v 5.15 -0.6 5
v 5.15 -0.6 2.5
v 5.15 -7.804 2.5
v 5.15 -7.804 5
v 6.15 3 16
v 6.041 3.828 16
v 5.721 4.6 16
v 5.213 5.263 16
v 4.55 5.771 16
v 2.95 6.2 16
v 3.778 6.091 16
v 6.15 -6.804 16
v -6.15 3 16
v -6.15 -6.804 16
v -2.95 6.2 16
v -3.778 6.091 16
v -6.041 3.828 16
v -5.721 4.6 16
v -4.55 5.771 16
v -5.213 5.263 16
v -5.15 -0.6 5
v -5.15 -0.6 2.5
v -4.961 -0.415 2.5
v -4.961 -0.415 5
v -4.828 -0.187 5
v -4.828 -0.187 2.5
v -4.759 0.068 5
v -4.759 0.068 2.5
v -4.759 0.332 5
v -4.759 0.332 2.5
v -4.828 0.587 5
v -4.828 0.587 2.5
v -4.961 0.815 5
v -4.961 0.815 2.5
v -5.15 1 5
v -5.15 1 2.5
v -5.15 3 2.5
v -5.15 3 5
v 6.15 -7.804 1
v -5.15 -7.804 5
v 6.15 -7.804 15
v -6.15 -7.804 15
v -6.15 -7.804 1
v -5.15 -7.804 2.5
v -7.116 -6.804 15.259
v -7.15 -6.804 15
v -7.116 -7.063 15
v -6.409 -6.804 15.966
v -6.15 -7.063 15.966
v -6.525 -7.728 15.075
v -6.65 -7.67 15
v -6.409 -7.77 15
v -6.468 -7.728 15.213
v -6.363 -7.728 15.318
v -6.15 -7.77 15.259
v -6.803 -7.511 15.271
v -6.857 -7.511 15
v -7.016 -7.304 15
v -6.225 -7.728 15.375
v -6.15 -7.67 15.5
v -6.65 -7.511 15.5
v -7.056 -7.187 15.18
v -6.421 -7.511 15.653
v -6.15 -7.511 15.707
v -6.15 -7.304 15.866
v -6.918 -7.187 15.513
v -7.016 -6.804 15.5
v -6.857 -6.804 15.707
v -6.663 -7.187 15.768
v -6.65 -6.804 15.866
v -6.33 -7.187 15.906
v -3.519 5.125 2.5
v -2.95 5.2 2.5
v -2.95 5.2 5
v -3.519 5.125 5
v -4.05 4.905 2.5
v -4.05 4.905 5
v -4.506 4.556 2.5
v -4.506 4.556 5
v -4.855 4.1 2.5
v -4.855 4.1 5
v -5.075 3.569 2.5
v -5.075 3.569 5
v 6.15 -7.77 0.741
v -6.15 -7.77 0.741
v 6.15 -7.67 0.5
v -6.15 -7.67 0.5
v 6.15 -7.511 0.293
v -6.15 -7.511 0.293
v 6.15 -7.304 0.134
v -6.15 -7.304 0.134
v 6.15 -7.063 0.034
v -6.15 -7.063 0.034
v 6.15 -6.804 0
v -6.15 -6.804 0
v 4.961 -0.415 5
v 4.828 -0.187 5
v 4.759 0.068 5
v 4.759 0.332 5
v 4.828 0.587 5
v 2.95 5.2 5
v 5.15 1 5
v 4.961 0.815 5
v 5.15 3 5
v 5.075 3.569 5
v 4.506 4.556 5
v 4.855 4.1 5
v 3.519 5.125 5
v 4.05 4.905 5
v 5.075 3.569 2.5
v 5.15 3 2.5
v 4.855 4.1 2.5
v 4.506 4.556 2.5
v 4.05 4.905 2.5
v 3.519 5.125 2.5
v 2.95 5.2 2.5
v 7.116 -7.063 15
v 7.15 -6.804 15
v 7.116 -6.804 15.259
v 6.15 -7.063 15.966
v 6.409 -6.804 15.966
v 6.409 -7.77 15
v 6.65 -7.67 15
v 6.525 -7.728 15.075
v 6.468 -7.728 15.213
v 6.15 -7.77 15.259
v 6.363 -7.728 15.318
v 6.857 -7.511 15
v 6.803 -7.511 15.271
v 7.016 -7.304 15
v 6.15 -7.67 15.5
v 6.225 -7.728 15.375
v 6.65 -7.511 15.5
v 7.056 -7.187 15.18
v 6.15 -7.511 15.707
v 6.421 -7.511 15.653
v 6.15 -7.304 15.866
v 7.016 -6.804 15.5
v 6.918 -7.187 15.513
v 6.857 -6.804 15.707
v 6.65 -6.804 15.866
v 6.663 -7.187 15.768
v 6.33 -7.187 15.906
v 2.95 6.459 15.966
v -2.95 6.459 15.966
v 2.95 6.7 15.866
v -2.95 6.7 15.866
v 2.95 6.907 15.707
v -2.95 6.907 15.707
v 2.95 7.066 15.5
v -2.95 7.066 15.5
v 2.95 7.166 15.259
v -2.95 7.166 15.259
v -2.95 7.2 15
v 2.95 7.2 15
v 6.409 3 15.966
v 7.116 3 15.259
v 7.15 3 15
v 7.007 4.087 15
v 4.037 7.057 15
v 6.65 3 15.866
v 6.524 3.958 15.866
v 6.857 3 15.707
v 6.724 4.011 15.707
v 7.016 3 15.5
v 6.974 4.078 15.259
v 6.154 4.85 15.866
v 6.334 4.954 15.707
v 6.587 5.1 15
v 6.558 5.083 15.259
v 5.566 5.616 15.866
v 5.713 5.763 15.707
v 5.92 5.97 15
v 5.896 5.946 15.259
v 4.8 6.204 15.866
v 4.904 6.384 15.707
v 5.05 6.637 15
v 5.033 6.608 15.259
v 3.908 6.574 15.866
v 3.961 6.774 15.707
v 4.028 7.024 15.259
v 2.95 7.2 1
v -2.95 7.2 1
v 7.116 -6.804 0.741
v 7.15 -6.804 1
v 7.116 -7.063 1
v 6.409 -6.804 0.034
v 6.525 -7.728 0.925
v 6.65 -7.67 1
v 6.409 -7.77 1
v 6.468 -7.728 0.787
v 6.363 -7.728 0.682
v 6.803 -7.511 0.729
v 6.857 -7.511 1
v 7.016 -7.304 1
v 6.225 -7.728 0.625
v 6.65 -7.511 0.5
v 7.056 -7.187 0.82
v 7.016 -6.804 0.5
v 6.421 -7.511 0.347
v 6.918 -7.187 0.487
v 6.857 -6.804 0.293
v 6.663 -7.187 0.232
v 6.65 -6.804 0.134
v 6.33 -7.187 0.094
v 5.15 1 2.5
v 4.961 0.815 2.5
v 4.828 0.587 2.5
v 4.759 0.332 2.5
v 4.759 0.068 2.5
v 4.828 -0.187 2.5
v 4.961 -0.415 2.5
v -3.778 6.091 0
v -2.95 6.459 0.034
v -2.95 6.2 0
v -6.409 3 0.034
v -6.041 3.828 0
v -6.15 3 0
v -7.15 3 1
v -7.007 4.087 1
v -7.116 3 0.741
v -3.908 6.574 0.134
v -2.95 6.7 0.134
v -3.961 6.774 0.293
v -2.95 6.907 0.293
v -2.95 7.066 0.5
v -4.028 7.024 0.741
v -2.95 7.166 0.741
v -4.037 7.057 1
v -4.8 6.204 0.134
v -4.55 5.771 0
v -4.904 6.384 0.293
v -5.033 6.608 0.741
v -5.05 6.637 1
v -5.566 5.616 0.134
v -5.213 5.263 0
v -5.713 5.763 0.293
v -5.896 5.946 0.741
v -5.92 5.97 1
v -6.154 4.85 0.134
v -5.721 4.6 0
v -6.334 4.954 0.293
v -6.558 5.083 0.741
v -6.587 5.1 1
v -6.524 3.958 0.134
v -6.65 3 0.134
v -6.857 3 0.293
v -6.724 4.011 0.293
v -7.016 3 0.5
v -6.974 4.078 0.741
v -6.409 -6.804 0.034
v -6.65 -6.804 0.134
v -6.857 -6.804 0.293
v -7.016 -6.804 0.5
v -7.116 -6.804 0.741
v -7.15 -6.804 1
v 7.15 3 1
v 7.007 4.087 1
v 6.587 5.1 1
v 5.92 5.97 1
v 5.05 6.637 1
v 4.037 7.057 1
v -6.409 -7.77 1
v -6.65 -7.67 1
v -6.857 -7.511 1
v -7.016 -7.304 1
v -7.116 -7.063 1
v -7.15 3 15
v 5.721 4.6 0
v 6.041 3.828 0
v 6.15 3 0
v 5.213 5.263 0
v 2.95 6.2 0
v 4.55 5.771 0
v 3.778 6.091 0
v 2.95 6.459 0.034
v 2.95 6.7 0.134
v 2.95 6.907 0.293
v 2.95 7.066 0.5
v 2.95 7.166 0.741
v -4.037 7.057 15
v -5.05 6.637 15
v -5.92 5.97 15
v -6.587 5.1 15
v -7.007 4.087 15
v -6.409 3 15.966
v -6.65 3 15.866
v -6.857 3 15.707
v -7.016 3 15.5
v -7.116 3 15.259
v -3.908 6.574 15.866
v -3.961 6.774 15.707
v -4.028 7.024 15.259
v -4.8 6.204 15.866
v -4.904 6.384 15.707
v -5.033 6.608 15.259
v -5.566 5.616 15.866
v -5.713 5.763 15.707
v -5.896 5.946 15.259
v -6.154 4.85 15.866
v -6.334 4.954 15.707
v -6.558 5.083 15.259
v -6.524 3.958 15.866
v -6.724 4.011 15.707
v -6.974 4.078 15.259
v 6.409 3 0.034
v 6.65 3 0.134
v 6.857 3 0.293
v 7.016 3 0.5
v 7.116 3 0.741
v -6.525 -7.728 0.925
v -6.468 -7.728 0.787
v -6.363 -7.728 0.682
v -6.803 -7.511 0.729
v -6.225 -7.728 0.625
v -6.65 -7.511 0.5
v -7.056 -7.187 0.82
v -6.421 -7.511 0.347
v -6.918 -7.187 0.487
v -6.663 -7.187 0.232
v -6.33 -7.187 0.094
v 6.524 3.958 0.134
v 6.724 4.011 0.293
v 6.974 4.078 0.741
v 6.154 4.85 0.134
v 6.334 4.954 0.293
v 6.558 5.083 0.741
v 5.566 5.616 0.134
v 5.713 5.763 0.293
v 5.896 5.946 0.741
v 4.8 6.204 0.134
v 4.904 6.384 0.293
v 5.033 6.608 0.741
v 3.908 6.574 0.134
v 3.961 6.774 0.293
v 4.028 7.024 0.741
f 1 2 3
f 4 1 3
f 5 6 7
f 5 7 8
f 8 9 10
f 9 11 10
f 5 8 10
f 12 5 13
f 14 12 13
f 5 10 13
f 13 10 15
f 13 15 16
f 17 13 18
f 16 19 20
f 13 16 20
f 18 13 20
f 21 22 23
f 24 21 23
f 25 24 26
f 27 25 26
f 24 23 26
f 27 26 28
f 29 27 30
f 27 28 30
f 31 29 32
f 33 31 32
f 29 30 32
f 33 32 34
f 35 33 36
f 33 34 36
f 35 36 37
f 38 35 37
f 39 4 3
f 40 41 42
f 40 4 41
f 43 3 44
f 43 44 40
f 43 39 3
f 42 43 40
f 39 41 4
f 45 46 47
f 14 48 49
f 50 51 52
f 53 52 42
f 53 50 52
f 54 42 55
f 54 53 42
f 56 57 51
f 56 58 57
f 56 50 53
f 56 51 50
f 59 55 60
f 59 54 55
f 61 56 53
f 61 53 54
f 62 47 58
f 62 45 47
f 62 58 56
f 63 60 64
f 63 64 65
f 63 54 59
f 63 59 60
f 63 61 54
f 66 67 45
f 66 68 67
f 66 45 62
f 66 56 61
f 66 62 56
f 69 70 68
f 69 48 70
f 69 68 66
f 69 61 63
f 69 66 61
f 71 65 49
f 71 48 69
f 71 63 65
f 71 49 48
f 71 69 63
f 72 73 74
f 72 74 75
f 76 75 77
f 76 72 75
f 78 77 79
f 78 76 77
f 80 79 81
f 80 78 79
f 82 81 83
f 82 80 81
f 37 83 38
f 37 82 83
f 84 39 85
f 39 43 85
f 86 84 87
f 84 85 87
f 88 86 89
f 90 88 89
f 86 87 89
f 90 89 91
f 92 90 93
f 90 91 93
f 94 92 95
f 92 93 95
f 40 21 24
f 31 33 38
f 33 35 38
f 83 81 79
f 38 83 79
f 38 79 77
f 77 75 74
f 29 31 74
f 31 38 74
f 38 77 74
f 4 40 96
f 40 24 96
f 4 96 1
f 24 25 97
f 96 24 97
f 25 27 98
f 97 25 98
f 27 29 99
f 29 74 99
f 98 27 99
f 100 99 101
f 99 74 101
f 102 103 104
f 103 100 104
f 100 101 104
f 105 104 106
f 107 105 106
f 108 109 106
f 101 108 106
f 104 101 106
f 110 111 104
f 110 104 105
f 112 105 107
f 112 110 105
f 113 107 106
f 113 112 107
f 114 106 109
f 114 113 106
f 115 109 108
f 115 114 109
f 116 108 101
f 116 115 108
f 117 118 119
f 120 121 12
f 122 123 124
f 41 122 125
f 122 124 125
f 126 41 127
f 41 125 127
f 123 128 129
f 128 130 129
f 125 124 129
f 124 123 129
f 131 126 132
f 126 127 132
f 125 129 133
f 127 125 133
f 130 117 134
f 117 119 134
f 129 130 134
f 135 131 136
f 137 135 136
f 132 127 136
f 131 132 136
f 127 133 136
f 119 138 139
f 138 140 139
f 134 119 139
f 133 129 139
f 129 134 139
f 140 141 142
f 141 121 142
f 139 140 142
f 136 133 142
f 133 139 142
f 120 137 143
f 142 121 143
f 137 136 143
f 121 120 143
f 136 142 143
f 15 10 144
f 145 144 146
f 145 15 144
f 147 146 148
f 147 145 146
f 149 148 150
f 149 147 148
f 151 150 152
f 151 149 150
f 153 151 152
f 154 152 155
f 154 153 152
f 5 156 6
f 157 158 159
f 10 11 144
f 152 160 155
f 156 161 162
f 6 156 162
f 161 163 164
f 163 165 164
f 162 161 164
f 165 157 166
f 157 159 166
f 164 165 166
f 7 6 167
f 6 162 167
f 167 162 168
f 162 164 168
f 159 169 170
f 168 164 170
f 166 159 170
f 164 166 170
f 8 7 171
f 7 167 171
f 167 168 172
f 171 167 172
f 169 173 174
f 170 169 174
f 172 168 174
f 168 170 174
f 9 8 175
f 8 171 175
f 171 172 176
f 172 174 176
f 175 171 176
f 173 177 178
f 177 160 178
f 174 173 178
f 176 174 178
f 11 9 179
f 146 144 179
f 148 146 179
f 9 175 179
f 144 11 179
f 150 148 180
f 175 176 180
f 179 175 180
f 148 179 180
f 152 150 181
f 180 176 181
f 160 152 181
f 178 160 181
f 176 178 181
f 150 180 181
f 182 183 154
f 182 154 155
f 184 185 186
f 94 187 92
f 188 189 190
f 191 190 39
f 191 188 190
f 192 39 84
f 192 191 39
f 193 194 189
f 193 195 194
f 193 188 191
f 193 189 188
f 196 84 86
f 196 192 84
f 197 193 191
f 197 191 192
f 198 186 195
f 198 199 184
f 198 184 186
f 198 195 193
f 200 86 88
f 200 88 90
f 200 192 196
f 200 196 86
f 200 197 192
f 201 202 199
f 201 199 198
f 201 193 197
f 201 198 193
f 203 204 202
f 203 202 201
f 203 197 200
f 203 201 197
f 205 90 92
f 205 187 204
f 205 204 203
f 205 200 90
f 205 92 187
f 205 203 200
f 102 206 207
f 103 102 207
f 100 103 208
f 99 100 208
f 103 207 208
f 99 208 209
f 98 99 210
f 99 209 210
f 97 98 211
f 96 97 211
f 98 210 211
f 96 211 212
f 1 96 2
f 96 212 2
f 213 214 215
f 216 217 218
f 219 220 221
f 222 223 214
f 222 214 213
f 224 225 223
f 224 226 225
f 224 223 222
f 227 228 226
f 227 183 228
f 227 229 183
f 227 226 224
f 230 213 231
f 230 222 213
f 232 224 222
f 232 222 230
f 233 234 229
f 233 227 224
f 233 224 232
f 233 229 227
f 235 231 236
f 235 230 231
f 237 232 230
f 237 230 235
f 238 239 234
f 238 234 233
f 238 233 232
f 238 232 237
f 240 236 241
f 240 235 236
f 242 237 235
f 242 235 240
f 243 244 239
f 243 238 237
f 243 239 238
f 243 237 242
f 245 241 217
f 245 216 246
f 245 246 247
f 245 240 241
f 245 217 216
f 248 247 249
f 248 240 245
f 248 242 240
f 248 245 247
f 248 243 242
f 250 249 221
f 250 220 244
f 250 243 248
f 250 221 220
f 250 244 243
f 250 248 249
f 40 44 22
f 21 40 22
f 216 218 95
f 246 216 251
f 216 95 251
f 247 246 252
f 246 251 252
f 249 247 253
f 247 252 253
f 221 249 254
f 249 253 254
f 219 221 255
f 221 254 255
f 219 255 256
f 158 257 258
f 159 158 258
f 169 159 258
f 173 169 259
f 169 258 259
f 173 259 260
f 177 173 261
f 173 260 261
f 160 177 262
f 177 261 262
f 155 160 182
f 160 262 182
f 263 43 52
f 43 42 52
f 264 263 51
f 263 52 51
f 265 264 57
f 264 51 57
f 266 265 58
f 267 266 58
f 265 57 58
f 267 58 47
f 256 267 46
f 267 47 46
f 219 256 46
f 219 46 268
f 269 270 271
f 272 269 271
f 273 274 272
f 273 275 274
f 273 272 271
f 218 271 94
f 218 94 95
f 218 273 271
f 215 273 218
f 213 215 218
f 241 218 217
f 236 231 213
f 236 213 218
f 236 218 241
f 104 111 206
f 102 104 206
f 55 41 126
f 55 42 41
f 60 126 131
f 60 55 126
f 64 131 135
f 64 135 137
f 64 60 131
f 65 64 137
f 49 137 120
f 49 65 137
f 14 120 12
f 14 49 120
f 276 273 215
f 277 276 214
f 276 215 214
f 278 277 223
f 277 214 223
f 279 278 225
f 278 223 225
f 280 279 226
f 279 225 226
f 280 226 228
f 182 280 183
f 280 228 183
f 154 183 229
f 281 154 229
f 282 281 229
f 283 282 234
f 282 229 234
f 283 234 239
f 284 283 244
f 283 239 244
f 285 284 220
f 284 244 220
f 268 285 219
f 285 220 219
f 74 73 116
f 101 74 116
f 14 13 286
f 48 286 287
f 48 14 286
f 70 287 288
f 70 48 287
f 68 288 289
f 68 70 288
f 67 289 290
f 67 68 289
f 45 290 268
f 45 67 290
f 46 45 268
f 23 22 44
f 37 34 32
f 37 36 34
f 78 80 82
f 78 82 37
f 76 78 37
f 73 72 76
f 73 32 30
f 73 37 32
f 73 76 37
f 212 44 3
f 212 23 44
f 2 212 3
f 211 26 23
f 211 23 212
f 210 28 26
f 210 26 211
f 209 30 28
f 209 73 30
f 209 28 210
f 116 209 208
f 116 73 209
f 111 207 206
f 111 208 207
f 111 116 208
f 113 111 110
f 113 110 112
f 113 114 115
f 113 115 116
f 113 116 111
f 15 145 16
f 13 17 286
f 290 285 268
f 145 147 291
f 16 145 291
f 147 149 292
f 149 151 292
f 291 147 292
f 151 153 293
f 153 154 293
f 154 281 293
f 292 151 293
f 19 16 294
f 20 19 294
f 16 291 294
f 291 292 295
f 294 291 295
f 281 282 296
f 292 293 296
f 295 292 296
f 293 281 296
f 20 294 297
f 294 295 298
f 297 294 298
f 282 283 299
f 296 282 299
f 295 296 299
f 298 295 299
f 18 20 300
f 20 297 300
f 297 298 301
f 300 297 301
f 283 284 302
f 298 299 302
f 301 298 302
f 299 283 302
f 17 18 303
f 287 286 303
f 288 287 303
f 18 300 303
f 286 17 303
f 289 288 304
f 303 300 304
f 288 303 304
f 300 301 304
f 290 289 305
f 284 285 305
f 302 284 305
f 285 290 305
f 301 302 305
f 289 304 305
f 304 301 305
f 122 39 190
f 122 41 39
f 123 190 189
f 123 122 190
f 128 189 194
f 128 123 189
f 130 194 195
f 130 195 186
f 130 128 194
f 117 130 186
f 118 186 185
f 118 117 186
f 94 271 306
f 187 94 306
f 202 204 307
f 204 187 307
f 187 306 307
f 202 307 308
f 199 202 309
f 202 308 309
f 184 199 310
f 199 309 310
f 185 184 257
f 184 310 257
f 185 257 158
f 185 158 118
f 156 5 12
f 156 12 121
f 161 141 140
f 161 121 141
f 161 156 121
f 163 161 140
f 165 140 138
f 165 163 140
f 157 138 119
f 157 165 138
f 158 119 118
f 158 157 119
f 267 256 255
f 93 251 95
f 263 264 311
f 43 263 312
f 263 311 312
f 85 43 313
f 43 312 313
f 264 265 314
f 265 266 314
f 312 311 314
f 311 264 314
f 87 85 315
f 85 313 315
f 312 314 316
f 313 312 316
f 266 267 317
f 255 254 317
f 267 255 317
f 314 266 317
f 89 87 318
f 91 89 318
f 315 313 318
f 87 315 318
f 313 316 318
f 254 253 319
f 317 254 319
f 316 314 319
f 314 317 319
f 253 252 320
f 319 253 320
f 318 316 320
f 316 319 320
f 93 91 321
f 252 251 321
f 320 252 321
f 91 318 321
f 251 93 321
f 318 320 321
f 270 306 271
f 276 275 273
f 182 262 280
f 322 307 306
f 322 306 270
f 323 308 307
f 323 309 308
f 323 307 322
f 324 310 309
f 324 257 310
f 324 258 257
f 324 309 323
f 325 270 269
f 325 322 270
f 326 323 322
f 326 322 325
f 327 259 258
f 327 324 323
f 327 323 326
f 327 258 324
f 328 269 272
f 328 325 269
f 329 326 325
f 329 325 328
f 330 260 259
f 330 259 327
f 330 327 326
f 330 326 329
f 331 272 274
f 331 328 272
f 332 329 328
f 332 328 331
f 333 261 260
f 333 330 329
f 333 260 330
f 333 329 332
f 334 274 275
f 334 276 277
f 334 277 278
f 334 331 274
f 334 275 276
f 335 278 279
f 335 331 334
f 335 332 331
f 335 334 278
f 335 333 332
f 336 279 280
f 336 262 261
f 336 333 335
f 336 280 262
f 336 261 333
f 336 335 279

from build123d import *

# Parameters (mm, degrees)
PAD002_DEPTH = 16
POCKET_DEPTH = 2.5
FILLET001_R  = 1


with BuildPart() as part:
    # Sketch003 → Pad002 (new body)
    with BuildSketch(Plane.XY):
        with BuildLine():
            Line((7.15, -7.803847), (-7.15, -7.803847))
            Line((-7.15, -7.803847), (-7.15, 3))
            ThreePointArc((-2.95, 7.2), (-5.919848, 5.969848), (-7.15, 3))
            Line((-2.95, 7.2), (2.95, 7.2))
            ThreePointArc((7.15, 3), (5.919848, 5.969848), (2.95, 7.2))
            Line((7.15, 3), (7.15, -7.803847))
        make_face()
    extrude(amount=PAD002_DEPTH)

    # Sketch004 → Pocket (cut)
    with BuildSketch(Plane.XY.offset(2.5)):
        with BuildLine():
            ThreePointArc((-2.95, 5.2), (-4.505635, 4.555635), (-5.15, 3))
            Line((-5.15, 1), (-5.15, 3))
            ThreePointArc((-5.15, -0.6), (-4.75, 0.2), (-5.15, 1))
            Line((-5.15, -7.803847), (-5.15, -0.6))
            Line((5.15, -7.803847), (-5.15, -7.803847))
            Line((5.15, -0.6), (5.15, -7.803847))
            ThreePointArc((5.15, 1), (4.75, 0.2), (5.15, -0.6))
            Line((5.15, 3), (5.15, 1))
            ThreePointArc((5.15, 3), (4.505635, 4.555635), (2.95, 5.2))
            Line((-2.95, 5.2), (2.95, 5.2))
        make_face()
    extrude(amount=POCKET_DEPTH, mode=Mode.SUBTRACT)

    # Fillet001
    fillet001_edges = [part.edges().sort_by_distance(p)[0] for p in [
        (-5.919848, 5.969848, 0),
        (-5.919848, 5.969848, 16),
        (-7.15, -7.803847, 8),
        (7.15, -7.803847, 8),
        (0, -7.803847, 16),
        (0, -7.803847, 0),
    ]]
    fillet(fillet001_edges, radius=FILLET001_R)


solid = part.part
